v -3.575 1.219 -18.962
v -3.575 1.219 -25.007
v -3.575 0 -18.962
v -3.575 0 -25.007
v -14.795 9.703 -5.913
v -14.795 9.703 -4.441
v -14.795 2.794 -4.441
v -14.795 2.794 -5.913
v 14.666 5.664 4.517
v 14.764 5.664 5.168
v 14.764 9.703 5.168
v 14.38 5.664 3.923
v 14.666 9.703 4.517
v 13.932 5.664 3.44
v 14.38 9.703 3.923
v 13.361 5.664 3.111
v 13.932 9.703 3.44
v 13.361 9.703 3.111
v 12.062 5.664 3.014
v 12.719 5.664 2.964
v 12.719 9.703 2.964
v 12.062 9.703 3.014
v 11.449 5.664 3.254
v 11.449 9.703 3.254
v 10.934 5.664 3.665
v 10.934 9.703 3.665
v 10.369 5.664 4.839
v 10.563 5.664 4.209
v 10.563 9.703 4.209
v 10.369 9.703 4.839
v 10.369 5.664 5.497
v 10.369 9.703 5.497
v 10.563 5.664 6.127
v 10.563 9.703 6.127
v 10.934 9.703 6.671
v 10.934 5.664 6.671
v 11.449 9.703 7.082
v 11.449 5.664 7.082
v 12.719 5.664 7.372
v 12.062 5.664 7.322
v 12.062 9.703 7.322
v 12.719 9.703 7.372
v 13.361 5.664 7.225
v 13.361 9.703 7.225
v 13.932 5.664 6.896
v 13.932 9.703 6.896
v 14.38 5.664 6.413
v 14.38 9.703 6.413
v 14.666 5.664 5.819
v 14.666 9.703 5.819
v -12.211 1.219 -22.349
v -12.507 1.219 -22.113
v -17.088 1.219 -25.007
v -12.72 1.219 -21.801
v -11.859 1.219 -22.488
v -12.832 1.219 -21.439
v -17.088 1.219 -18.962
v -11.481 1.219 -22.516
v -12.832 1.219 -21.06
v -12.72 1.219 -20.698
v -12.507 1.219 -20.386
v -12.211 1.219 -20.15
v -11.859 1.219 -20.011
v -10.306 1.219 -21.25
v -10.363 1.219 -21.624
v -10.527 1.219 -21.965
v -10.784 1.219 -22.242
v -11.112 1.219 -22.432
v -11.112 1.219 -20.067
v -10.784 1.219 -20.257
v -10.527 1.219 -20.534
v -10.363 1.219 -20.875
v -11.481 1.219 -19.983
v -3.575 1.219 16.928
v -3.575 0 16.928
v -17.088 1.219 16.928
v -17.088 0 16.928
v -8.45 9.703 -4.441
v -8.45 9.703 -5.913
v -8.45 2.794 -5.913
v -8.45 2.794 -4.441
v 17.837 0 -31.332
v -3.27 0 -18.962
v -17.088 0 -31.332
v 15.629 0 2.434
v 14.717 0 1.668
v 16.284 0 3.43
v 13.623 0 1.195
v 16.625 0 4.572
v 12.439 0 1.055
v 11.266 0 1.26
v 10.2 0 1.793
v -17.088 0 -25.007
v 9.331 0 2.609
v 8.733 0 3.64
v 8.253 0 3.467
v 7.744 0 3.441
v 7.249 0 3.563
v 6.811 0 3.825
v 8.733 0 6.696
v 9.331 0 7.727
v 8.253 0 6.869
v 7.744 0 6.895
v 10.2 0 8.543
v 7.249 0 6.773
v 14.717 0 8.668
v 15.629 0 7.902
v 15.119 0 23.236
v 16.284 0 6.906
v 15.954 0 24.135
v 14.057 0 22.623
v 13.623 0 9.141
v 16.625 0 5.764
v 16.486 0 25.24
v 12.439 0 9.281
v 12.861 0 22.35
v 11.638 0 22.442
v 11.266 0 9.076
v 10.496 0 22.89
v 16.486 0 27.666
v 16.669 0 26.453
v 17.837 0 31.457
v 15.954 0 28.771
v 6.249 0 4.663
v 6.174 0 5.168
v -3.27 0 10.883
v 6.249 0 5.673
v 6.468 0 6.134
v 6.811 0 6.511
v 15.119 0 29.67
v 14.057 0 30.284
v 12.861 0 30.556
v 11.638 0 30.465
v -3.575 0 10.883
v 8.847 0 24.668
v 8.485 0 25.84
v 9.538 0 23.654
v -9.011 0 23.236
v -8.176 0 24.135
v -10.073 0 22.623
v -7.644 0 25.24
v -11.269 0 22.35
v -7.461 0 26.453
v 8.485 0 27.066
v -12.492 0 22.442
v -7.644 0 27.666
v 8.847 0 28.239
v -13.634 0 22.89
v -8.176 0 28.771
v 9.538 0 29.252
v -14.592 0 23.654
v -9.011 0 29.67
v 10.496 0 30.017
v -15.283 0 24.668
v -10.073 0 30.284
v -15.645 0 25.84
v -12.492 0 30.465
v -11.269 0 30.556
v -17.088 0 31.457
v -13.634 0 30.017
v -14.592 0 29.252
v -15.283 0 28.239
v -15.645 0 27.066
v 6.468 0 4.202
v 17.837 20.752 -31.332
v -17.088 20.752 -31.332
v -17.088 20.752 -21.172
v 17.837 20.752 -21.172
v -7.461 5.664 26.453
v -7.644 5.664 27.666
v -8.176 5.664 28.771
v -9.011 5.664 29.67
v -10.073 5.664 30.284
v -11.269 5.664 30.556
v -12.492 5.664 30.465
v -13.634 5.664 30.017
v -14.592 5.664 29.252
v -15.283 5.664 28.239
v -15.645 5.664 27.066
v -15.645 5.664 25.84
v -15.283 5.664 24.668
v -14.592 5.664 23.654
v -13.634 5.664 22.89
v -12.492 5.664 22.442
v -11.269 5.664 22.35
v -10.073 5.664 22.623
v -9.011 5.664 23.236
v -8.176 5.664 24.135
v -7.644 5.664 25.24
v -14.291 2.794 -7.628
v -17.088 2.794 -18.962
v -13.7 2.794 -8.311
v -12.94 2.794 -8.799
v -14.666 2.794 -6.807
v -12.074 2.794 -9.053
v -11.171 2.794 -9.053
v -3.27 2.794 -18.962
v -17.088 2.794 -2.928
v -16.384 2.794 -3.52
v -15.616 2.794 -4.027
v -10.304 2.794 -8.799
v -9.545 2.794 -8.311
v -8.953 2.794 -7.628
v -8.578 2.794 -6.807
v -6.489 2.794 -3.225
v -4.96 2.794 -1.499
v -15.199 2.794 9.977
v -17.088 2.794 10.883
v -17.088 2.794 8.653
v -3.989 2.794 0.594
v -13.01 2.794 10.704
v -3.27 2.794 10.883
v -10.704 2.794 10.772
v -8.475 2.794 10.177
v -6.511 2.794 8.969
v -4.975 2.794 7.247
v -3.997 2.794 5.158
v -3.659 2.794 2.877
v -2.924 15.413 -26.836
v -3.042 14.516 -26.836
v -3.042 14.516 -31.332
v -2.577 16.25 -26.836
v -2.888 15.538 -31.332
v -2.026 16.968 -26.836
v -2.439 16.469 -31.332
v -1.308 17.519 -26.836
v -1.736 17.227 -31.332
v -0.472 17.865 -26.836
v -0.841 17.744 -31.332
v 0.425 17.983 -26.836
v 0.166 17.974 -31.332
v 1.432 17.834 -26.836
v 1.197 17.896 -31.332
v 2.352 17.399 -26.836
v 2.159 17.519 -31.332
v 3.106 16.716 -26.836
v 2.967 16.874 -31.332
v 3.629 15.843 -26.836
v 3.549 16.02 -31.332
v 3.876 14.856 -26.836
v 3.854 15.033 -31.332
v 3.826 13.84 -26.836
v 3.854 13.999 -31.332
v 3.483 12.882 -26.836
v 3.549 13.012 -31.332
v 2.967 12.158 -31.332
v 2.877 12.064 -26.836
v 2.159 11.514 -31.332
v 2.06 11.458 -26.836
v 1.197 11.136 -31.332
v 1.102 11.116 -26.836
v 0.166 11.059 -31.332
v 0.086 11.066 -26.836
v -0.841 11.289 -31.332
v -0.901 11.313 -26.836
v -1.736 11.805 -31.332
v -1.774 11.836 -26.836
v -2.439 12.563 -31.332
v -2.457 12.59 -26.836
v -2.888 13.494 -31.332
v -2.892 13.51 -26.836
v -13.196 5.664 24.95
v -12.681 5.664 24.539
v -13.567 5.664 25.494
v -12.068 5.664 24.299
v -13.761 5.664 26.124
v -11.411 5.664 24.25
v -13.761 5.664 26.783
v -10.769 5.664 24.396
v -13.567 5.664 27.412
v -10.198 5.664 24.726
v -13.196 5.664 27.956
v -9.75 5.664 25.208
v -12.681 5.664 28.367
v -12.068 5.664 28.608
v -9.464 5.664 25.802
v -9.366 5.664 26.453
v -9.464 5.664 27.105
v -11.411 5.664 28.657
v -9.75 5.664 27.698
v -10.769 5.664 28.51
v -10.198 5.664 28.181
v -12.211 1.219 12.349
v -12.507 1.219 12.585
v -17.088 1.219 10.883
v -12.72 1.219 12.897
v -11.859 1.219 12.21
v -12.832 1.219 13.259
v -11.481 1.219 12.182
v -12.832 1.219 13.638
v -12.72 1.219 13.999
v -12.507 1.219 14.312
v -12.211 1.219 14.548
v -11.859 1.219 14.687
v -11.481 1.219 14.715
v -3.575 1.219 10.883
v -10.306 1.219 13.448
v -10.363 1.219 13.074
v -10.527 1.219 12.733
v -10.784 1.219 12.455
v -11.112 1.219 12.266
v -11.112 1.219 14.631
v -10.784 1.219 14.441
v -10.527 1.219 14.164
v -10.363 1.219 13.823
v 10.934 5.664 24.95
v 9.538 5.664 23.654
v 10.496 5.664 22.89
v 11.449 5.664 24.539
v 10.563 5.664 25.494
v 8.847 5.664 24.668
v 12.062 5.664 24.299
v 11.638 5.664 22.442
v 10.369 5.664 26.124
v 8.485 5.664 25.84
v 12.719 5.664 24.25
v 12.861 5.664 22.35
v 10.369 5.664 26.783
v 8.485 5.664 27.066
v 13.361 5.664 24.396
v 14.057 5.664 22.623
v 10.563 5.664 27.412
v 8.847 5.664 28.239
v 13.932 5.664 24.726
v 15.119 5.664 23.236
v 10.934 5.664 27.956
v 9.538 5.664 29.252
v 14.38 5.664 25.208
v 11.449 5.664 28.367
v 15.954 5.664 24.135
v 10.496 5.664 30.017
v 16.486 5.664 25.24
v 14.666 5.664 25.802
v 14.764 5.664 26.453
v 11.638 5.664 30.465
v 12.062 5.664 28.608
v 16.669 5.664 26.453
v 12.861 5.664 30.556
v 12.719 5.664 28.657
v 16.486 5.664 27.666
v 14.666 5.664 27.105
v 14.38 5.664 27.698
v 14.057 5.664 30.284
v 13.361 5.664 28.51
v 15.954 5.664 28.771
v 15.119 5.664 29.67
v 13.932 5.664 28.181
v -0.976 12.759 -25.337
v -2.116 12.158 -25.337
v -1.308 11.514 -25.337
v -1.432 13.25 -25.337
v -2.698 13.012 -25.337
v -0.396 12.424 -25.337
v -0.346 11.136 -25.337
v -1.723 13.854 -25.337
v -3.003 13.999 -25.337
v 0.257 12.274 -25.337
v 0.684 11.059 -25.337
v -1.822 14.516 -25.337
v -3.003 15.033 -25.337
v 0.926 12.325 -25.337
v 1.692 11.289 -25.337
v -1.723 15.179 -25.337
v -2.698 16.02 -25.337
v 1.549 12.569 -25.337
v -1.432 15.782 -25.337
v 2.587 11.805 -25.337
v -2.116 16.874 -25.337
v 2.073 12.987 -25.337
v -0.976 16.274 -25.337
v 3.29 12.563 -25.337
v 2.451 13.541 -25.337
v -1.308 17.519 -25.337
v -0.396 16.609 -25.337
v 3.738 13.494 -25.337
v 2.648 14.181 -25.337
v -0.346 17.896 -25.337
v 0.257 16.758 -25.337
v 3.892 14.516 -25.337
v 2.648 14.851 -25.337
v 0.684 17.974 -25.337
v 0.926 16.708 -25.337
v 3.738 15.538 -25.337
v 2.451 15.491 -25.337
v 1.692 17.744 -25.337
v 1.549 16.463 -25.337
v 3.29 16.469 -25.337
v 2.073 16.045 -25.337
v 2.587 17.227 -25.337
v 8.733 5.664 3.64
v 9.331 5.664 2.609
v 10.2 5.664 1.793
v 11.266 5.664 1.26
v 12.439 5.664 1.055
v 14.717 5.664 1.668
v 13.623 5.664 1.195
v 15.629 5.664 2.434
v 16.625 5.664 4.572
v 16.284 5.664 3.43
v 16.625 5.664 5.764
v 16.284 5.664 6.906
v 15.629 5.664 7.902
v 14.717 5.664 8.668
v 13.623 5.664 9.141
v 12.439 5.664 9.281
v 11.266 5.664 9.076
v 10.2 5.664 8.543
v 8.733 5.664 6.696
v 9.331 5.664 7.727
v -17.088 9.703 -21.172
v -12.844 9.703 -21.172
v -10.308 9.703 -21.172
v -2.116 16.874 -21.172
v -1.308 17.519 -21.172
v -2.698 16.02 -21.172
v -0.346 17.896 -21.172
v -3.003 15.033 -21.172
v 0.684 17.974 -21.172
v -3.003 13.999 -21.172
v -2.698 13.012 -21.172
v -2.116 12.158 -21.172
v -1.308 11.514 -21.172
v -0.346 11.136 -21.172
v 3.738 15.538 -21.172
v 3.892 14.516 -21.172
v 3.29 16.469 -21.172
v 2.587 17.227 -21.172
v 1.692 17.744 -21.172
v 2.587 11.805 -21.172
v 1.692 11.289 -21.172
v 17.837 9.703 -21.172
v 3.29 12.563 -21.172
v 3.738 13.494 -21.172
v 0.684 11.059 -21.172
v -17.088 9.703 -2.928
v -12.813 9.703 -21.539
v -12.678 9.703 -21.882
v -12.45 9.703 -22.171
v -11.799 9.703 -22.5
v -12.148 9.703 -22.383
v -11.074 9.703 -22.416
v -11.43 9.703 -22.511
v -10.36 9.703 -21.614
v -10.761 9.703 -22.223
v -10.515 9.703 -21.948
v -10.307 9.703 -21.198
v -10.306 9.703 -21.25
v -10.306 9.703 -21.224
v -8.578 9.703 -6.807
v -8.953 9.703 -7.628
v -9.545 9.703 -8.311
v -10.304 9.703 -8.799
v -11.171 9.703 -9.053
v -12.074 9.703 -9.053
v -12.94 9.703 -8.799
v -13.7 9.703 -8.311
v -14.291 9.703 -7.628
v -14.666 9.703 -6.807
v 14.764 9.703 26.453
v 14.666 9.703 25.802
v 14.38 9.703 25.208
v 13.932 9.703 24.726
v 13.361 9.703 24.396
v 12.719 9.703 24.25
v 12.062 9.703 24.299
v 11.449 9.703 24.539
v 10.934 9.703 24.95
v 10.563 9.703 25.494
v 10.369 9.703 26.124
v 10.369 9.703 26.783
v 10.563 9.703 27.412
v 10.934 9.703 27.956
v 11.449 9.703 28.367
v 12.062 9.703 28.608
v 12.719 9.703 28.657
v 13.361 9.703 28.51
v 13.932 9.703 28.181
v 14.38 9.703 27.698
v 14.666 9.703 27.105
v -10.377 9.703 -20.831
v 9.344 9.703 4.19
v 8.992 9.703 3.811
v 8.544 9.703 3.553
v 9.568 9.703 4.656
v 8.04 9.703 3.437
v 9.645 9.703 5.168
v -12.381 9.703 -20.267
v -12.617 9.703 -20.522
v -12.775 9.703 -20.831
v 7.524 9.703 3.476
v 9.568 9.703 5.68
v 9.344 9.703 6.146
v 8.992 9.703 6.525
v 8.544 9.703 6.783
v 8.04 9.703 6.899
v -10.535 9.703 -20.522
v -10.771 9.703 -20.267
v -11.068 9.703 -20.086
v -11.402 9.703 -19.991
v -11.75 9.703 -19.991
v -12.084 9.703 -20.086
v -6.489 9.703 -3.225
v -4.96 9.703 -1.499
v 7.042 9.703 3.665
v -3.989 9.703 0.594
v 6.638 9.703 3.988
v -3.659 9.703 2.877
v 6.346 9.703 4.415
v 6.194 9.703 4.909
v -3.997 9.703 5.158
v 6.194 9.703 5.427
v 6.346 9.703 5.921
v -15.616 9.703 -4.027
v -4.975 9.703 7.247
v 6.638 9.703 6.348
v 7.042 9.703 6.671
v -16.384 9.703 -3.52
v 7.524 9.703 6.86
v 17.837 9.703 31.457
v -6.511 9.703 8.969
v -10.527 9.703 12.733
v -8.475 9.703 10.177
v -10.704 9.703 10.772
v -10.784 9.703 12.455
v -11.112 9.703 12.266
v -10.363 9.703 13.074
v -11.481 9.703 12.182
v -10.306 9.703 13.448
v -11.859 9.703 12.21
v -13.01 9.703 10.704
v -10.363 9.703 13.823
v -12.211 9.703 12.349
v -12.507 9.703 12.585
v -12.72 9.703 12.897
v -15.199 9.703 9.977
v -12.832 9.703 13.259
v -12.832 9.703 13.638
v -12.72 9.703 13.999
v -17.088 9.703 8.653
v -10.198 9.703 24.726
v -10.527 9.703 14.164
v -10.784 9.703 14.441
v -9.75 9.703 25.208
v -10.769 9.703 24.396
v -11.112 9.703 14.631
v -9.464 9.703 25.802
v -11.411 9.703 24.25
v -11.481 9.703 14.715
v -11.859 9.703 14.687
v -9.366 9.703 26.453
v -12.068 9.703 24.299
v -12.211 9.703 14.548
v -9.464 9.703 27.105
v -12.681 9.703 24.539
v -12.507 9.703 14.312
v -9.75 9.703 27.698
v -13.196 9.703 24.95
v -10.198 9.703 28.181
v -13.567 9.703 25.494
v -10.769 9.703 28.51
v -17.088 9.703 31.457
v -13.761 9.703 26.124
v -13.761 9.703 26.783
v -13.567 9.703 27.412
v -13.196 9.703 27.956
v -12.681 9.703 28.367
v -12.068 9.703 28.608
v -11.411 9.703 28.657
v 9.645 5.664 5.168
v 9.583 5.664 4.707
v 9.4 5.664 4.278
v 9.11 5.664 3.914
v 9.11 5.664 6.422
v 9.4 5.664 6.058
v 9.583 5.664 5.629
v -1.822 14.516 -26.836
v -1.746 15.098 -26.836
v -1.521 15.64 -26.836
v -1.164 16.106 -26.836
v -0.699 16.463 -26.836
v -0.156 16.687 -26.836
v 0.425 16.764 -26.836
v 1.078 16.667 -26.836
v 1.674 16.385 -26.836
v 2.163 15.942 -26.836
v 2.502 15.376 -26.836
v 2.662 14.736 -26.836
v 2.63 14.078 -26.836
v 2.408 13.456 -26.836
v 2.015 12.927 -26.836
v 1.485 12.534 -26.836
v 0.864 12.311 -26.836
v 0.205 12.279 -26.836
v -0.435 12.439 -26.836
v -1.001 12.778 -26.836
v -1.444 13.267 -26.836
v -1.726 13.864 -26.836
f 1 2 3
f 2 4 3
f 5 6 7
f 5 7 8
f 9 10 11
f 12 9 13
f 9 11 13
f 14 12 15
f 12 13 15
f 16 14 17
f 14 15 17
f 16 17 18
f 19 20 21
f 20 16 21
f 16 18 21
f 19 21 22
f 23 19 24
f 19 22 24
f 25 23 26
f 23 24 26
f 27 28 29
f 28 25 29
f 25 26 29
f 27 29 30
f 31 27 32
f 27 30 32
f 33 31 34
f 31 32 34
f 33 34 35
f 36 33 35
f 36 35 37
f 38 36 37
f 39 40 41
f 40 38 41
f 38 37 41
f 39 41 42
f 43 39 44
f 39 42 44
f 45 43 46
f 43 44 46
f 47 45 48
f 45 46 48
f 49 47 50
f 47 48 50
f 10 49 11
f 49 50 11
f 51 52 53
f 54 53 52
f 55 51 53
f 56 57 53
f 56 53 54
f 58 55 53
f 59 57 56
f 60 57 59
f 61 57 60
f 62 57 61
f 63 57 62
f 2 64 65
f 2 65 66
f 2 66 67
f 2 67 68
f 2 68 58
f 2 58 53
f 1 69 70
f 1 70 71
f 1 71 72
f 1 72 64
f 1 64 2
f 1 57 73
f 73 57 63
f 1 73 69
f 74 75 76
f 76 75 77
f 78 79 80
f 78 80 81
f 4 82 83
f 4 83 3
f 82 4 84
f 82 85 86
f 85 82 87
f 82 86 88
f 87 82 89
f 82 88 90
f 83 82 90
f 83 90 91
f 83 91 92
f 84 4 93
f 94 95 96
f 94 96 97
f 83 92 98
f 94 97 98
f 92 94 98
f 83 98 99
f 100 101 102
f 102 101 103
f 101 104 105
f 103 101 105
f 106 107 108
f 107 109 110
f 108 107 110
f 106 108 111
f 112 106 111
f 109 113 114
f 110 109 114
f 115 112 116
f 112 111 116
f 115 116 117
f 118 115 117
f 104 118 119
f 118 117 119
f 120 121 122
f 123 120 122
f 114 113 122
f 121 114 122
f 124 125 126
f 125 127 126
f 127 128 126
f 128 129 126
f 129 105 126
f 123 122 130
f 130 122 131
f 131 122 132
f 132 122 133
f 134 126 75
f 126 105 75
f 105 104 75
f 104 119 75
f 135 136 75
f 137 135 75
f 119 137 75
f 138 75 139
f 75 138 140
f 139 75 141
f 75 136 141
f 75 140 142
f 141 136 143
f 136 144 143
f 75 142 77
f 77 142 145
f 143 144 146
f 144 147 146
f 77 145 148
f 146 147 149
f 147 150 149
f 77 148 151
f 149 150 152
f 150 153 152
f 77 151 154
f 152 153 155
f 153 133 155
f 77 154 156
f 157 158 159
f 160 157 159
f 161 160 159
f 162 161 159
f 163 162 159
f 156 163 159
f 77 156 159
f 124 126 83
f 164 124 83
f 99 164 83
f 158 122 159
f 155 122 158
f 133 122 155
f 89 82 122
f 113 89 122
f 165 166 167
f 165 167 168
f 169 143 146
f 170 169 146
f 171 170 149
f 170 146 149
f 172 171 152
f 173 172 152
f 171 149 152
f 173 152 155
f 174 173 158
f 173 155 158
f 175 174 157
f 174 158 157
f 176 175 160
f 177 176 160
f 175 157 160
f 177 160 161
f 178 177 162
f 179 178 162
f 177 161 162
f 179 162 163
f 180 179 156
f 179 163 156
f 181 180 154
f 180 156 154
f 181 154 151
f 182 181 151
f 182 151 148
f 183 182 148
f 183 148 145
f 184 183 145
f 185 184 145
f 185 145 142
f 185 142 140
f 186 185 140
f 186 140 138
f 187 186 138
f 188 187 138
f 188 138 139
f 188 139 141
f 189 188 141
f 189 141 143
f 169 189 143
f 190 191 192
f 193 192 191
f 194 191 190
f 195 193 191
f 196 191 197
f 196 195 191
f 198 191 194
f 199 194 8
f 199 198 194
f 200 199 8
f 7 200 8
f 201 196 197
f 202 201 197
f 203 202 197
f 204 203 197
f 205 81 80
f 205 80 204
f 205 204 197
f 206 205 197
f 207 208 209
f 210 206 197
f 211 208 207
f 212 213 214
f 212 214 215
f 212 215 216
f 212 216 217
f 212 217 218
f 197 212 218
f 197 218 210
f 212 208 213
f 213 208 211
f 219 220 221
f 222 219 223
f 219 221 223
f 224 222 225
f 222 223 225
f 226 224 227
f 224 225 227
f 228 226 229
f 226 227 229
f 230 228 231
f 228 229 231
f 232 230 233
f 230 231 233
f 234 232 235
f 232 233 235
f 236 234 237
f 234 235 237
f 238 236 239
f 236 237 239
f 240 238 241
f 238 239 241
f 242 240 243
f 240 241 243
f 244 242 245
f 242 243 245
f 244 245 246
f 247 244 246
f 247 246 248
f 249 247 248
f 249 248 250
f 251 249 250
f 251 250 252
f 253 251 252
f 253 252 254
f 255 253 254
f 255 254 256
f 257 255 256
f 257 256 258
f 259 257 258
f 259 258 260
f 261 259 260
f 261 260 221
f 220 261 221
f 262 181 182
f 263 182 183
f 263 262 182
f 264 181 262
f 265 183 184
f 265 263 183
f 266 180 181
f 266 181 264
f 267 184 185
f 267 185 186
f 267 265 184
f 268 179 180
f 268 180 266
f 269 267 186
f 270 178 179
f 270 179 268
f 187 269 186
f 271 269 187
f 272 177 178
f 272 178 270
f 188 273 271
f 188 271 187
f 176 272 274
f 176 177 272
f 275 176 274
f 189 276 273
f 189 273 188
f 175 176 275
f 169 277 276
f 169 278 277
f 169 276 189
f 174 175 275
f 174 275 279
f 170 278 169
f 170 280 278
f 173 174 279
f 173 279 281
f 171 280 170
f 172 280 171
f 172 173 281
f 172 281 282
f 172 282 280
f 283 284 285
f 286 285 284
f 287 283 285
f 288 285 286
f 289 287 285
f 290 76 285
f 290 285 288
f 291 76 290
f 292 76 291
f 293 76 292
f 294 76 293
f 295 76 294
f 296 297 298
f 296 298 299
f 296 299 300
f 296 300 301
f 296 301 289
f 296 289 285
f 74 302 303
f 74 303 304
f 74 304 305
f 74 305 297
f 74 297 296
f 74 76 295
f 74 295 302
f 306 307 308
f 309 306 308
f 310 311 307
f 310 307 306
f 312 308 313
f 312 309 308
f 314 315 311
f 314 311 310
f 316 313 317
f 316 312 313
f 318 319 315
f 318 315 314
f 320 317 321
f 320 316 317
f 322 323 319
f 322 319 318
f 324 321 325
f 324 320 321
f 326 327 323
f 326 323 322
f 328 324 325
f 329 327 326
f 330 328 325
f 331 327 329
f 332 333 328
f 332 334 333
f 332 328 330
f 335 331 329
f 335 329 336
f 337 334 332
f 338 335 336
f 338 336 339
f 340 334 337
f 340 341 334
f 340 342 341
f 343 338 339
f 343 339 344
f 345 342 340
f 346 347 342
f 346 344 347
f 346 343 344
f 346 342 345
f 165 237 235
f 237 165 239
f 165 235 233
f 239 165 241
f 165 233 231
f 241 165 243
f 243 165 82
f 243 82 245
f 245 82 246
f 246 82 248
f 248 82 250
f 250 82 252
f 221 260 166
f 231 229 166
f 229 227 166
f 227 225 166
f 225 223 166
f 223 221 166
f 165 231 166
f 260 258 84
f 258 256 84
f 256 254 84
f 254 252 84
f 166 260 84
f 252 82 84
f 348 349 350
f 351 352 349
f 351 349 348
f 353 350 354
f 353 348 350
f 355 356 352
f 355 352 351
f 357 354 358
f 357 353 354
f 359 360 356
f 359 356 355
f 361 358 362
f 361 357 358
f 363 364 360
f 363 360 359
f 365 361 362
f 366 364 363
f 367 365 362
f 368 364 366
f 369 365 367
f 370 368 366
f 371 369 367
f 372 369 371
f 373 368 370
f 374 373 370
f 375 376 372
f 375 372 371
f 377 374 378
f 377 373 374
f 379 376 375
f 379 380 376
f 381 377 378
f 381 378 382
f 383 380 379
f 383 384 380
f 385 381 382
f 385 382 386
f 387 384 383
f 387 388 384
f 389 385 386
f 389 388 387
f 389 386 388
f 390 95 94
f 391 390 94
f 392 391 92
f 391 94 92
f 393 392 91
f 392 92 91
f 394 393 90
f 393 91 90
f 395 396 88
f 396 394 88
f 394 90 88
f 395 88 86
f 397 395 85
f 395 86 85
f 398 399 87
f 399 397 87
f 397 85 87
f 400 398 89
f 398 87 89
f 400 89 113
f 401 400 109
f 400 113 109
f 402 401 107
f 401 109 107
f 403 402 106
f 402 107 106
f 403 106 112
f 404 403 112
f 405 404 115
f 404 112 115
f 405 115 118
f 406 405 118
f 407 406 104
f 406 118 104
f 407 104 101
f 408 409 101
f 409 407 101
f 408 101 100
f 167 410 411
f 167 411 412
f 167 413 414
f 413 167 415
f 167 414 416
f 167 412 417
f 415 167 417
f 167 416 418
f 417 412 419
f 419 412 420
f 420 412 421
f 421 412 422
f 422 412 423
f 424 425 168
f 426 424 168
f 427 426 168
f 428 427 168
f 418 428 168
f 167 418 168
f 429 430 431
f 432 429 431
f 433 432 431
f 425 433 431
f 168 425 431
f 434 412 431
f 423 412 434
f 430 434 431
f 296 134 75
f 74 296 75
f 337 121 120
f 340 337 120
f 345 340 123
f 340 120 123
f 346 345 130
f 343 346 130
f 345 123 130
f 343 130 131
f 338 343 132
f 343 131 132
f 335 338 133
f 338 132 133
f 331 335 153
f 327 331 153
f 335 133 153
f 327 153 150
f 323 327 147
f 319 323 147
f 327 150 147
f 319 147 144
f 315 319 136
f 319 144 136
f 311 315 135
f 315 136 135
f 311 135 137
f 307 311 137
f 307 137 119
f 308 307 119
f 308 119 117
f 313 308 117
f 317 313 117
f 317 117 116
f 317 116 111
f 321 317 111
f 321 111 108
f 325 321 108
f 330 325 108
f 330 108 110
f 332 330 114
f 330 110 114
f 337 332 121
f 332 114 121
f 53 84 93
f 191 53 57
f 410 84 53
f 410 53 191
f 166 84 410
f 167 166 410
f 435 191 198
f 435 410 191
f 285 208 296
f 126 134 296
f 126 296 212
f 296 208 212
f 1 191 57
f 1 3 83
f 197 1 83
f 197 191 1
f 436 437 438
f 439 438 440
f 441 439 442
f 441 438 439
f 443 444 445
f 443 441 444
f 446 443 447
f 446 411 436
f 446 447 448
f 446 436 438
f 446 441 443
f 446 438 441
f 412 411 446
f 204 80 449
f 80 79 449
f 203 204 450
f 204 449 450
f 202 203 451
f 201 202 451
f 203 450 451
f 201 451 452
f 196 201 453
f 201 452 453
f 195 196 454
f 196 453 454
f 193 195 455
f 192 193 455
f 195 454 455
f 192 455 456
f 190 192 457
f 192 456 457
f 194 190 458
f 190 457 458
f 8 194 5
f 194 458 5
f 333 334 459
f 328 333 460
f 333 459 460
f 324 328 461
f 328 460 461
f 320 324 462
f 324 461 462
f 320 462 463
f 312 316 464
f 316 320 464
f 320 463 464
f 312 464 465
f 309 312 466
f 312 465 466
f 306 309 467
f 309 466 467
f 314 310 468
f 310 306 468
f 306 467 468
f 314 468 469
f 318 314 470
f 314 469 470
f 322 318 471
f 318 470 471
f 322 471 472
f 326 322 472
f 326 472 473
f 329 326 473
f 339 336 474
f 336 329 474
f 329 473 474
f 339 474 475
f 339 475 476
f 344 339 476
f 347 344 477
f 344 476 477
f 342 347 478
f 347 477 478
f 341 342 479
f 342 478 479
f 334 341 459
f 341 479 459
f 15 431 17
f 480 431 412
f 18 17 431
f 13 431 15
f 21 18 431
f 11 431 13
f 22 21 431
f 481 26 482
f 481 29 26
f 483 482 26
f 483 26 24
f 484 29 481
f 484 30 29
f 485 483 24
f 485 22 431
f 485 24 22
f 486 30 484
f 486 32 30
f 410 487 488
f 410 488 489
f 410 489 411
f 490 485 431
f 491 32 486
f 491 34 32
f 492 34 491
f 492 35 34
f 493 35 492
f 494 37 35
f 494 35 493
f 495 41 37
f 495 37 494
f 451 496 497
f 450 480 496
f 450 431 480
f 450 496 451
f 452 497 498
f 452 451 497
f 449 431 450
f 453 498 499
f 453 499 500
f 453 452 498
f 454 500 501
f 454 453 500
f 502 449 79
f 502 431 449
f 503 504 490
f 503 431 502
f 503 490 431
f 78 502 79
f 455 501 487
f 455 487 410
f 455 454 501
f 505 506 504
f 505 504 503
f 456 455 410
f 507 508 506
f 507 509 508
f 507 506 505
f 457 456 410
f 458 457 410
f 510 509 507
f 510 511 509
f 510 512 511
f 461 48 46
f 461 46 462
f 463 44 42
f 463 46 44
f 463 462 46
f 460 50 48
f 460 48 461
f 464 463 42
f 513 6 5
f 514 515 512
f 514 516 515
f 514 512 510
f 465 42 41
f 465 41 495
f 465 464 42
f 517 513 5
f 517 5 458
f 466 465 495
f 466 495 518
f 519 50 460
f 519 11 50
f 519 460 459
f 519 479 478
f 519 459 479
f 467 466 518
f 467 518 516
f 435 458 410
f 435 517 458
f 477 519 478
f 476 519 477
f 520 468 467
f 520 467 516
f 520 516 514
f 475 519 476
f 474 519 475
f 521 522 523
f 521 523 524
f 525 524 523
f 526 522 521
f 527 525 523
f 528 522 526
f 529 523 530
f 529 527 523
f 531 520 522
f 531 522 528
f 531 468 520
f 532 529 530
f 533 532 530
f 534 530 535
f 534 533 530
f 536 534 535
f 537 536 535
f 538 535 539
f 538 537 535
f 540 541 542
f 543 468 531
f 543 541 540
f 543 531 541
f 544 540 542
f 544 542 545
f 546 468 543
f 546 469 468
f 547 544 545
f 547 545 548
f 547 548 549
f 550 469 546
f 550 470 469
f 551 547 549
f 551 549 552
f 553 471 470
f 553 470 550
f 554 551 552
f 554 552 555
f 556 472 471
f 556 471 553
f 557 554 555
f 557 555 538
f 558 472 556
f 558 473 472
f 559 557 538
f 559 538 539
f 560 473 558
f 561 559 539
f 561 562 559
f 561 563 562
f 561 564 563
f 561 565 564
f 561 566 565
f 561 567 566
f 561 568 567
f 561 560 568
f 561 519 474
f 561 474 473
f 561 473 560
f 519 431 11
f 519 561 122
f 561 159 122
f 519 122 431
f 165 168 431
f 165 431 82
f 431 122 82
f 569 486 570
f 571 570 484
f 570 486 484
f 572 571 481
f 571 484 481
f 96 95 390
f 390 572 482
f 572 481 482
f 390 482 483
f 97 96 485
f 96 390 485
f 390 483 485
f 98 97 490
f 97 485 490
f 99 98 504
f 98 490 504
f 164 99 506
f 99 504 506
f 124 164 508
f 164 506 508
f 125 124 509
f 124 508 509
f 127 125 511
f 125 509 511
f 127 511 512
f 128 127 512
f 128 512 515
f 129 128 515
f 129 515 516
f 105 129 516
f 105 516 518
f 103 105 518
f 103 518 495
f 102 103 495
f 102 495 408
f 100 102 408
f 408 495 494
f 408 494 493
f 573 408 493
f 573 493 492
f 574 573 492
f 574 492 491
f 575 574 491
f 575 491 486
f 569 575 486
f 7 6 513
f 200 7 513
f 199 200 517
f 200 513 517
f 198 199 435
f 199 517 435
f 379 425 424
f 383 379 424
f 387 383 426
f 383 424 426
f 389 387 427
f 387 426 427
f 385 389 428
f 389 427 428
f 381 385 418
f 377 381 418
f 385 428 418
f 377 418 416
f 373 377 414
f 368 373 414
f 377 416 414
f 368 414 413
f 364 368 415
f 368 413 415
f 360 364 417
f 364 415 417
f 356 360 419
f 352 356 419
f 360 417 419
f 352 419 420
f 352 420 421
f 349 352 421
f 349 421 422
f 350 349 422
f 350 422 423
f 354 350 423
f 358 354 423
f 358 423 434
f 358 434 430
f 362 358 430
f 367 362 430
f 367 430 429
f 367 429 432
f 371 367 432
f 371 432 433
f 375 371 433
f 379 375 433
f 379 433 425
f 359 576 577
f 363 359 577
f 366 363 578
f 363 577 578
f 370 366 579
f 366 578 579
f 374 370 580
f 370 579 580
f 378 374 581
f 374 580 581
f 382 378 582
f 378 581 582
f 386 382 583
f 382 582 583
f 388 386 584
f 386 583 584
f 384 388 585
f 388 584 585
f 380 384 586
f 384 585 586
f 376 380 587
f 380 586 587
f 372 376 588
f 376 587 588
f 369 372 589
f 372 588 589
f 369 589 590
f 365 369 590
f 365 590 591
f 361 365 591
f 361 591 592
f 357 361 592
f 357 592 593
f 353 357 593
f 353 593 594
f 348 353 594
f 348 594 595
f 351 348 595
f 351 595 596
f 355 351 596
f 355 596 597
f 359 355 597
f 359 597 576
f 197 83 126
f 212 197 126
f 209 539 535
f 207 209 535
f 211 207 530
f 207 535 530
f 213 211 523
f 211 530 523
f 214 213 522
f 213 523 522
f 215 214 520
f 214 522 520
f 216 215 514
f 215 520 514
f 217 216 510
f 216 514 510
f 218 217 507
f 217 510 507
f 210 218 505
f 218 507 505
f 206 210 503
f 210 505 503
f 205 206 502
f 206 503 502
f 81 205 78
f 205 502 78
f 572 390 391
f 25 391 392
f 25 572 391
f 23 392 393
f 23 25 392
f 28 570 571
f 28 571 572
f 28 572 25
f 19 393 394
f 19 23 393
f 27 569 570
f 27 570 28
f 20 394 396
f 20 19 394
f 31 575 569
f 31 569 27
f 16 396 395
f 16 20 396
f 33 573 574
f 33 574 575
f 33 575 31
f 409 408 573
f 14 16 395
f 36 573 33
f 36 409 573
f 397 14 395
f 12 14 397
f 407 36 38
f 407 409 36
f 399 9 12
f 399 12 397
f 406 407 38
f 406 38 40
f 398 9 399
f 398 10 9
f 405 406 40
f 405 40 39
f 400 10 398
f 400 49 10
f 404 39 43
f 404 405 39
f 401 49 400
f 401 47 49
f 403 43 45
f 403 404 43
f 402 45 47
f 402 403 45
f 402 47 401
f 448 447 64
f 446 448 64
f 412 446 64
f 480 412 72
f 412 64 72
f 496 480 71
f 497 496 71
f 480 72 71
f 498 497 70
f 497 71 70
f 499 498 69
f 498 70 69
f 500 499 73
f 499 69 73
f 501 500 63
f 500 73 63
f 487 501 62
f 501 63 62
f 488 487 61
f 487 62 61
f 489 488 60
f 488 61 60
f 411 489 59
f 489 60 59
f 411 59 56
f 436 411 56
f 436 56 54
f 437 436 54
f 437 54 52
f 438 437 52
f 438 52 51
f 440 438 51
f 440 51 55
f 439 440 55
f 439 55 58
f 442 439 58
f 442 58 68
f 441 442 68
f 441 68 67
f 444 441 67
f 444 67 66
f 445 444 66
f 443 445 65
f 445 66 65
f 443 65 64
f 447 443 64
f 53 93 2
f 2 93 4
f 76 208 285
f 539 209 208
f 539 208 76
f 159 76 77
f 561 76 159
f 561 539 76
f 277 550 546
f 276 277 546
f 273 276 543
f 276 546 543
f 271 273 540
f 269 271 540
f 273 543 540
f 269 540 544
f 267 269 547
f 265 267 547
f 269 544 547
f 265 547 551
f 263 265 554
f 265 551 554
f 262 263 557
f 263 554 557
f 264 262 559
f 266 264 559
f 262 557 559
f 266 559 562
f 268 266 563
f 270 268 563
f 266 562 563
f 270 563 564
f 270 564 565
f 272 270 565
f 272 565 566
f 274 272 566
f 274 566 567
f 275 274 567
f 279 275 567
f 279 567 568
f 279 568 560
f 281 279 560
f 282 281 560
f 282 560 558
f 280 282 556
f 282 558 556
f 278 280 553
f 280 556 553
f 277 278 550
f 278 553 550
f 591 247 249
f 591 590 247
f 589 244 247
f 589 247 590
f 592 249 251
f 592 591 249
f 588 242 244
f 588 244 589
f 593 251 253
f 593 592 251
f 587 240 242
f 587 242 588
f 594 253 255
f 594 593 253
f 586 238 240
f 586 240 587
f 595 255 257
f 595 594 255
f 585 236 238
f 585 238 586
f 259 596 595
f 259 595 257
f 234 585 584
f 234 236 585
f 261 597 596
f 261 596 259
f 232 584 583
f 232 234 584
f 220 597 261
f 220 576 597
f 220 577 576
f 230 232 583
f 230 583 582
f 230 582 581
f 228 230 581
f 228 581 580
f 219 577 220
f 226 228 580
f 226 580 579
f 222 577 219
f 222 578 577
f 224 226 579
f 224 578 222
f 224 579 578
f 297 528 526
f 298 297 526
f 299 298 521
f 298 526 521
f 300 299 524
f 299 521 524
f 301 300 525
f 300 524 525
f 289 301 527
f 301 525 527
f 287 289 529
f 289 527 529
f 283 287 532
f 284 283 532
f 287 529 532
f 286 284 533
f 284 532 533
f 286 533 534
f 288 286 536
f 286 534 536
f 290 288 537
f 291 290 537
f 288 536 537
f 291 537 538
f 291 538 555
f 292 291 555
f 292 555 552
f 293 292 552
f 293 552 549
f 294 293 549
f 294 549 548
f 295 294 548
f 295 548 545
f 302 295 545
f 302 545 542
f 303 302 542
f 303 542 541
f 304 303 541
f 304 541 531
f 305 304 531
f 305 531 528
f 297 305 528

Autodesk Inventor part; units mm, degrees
ref_plane "YZ Plane" through (0, 0, 0) normal (1, 0, 0) x (0, 1, 0)
ref_plane "XZ Plane" through (0, 0, 0) normal (0, 1, 0) x (-1, 0, 0)
sketch "Sketch1" plane through (0, 0, 0) normal (0, 1, 0) x (-1, 0, 0)
  line L0 (17.0879, 31.457) -> (-17.8371, 31.457)
  line L1 (-17.8371, 31.457) -> (-17.8371, -31.3318)
  line L2 (-17.8371, -31.3318) -> (17.0879, -31.3318)
  line L3 (17.0879, -31.3318) -> (17.0879, 31.457)
  point P0 (0, 0)
  dimension "d0" = 34.925
  dimension "d1" = 62.7888
extrude "Extrusion1" add sketch "Sketch1" along normal blind 9.7028
sketch "Sketch2" plane through (0, 9.7028, 0) normal (0, 1, 0) x (1, 0, 0)
  line L0 (17.8371, -31.457) -> (17.8371, 31.3318) projected
  line L1 (-17.0879, 31.3318) -> (-17.0879, -31.457) projected
  line L2 (17.8371, 31.3318) -> (-17.0879, 31.3318)
  line L3 (-17.0879, 31.3318) -> (-17.0879, 21.1718)
  line L4 (-17.0879, 21.1718) -> (17.8371, 21.1718)
  line L5 (17.8371, 21.1718) -> (17.8371, 31.3318)
  point P0 (0, 0)
  dimension "d4" = 10.16
extrude "Extrusion2" add sketch "Sketch2" along normal blind 11.049
sketch "Sketch3" plane through (0, 0, 0) normal (0, -1, 0) x (1, 0, 0)
  line L0 (17.8371, -31.3318) -> (-17.0879, -31.3318) projected
  line L1 (-17.0879, -31.3318) -> (-17.0879, -25.0072)
  line L2 (-17.0879, -31.3318) -> (-17.0879, 31.457) projected
  line L3 (-17.0879, -25.0072) -> (-3.5751, -25.0072)
  line L4 (-3.5751, -25.0072) -> (-3.5751, -18.962)
  line L5 (-3.5751, -18.962) -> (-3.2703, -18.962)
  line L6 (-3.2703, -18.962) -> (-3.2703, 10.883)
  line L7 (-3.2703, 10.883) -> (-3.5751, 10.883)
  line L8 (-3.5751, 10.883) -> (-3.5751, 16.9282)
  line L9 (-3.5751, 16.9282) -> (-16.9609, 16.9282)
  line L10 (-16.9609, 16.9282) -> (-17.0879, 16.9282)
  point P0 (0, 0)
  dimension "d7" = 6.3246
  dimension "d8" = 13.5128
  dimension "d9" = 6.0452
  dimension "d10" = 0.3048
  dimension "d11" = 29.845
  dimension "d14" = 0.3048
  dimension "d15" = 6.0452
  dimension "d16" = 13.3858
extrude "Extrusion3" cut sketch "Sketch3" against normal blind 2.794
sketch "Sketch4" plane through (0, 2.794, 0) normal (0, -1, 0) x (1, 0, 0)
  line L0 (-3.5751, 16.9282) -> (-17.0879, 16.9282)
  line L1 (-17.0879, 16.9282) -> (-17.0879, 10.883)
  line L2 (-17.0879, 10.883) -> (-3.5751, 10.883)
  line L3 (-3.5751, 10.883) -> (-3.5751, 16.9282)
  point P0 (0, 0)
  dimension "d19" = 13.5128
  dimension "d20" = 6.0452
sketch "Sketch5" plane through (0, 2.794, 0) normal (0, -1, 0) x (1, 0, 0)
  line L0 (-3.5751, -18.962) -> (-3.5751, -25.0072) projected
  line L1 (-3.5751, -25.0072) -> (-17.0879, -25.0072)
  line L2 (-17.0879, -25.0072) -> (-17.0879, -18.962)
  line L3 (-17.0879, -18.962) -> (-3.5751, -18.962)
  line L4 (-3.5751, -18.962) -> (-3.5751, -25.0072)
  point P0 (0, 0)
  dimension "d21" = 13.5128
  dimension "d22" = 6.0452
extrude "Extrusion5" add sketch "Sketch4" along normal blind 1.5748
extrude "Extrusion6" add sketch "Sketch5" along normal blind 1.5748
sketch "Sketch6" plane through (0, 9.7028, 0) normal (0, 1, 0) x (1, 0, 0)
  circle A0 centre (-11.6221, -2.8625) radius 7.9629
  line L0 (-17.0879, 18.962) -> (-17.0879, -10.883) projected
  line L1 (-11.6221, -10.1806) -> (-11.6221, 5.913) construction
  line L2 (-14.7946, -10.1806) -> (-14.7946, 5.913)
  line L3 (-8.4496, 5.913) -> (-8.4496, -10.1806)
  arc A1 (-8.4496, 5.913) -> (-14.7946, 5.913) centre (-11.6221, 5.913) ccw
  point P0 (0, 0)
  point P1 (-17.0879, 21.1718)
  point P2 (-11.6221, -2.1338)
  point P3 (-17.0879, 2.9283)
  point P4 (-17.0879, -8.6532)
  point P5 (-8.4496, 4.4412)
  point P6 (-14.7946, 4.4412)
  dimension "d31" = 15.9258
extrude "Extrusion7" cut sketch "Sketch6" against normal blind 25.4 contours A0 L3 | L3 A0 L2 | A0 L2 A1 L3 | L2 A0 L0
ref_plane "Work Plane1" through (0, 0, 0) normal (0, 1, 0) x (1, 0, 0)
sketch "Sketch7" plane through (0, 9.7028, 0) normal (0, 1, 0) x (1, 0, 0)
  line L0 (17.8371, -31.457) -> (17.8371, -28.663)
  line L1 (17.8371, -28.663) -> (17.8371, -26.4532)
  line L2 (14.7637, -26.4532) -> (12.5539, -26.4532)
  circle A0 centre (12.5539, -26.4532) radius 2.2098
  circle A1 centre (12.5539, -5.168) radius 2.2098
  line L3 (-17.0879, -8.6532) -> (-17.0879, -31.457) projected
  line L4 (-17.0879, -26.4532) -> (-13.7859, -26.4532) construction
  circle A2 centre (-11.5761, -26.4532) radius 2.2098
  line L5 (-11.5761, -14.7184) -> (-11.5761, -13.4484)
  circle A3 centre (-11.5761, -13.4484) radius 1.27
  line L6 (-11.5761, -13.4484) -> (-17.0879, -13.4484)
  line L7 (-17.0879, -16.9282) -> (-17.0879, -10.883) projected
  circle A4 centre (12.5539, -5.168) radius 4.1148
  circle A5 centre (12.5539, -26.4532) radius 4.1148
  circle A6 centre (-11.5761, -26.4532) radius 4.1148
  point P0 (0, 0)
  dimension "d37" = 2.794
  dimension "d38" = 2.2098
  dimension "d39" = 3.0734
  dimension "d40" = 2.2098
  dimension "d42" = 4.4196
  dimension "d43" = 4.4196
  dimension "d47" = 4.4196
  dimension "d49" = 1.27
  dimension "d50" = 2.54
  dimension "d58" = 8.2296
  dimension "d59" = 8.2296
  dimension "d60" = 8.2296
extrude "Extrusion8" cut sketch "Sketch7" against normal blind 25.4 contours A0 | A1 | A2 | A3 L6 L5 | L5 L6 A3
sketch "Sketch9" plane through (0, 1.2192, 0) normal (0, -1, 0) x (1, 0, 0)
  line L0 (-3.5751, -18.962) -> (-17.0879, -18.962) projected
  line L1 (-17.0879, -18.962) -> (-11.5761, -18.962)
  line L2 (-11.5761, -25.0595) -> (-11.5761, -21.2495)
  circle A0 centre (-11.5761, -21.2495) radius 1.27
  point P0 (0, 0)
  dimension "d53" = 5.5118
  dimension "d54" = 3.81
  dimension "d55" = 2.54
extrude "Extrusion9" cut sketch "Sketch9" against normal blind 8.4836
sketch "Sketch11" plane through (0, 0, 0) normal (0, -1, 0) x (1, 0, 0)
  circle A0 centre (-11.5761, 26.4532) radius 2.2098 projected
  circle A1 centre (-11.5761, 26.4532) radius 4.1148
  circle A2 centre (12.5539, 26.4532) radius 2.2098 projected
  circle A3 centre (12.5539, 26.4532) radius 4.1148
  circle A4 centre (12.5539, 5.168) radius 2.2098 projected
  circle A5 centre (12.5539, 5.168) radius 4.1148
  point P0 (0, 0)
  dimension "d62" = 8.2296
  dimension "d63" = 8.2296
  dimension "d64" = 8.2296
extrude "Extrusion10" cut sketch "Sketch11" against normal blind 5.6642 contours A0 | A1 | A3 | A5
sketch "Sketch12" plane through (17.8371, 0, -31.3318) normal (0, 0, -1) x (-1, 0, 0)
  line L0 (0, 0) -> (0, 20.7518) projected
  line L1 (0, 20.7518) -> (13.9446, 20.7518)
  line L2 (0, 20.7518) -> (34.925, 20.7518) projected
  line L3 (13.9446, 20.7518) -> (17.4117, 20.7518)
  line L4 (17.4117, 20.7518) -> (17.4117, 17.9832)
  line L5 (17.4117, 17.9832) -> (17.4117, 14.5161)
  circle A0 centre (17.4117, 14.5161) radius 2.2479
  circle A1 centre (17.4117, 14.5161) radius 3.4671
  point P0 (17.8371, 0)
  dimension "d67" = 13.9446
  dimension "d68" = 3.4671
  dimension "d69" = 2.7686
  dimension "d70" = 3.4671
  dimension "d71" = 4.4958
  dimension "d72" = 6.9342
extrude "Extrusion11" cut sketch "Sketch12" against normal through all contours A0
extrude "Extrusion13" cut sketch "Sketch12" against normal blind 4.4958
sketch "Sketch13" plane through (-17.0879, 20.7518, -21.1718) normal (0, 0, 1) x (1, 0, 0)
  circle A0 centre (17.5133, -6.2357) radius 3.4671 projected
  circle A1 centre (17.5133, -6.2357) radius 2.7813
  point P0 (17.0879, -20.7518)
  dimension "d79" = 5.5626
extrude "Extrusion14" cut sketch "Sketch13" against normal blind 4.1656 contours A0 | A1
sketch "Sketch14" plane through (0, 9.7028, 0) normal (0, 1, 0) x (1, 0, 0)
  circle A0 centre (7.9099, -5.168) radius 1.7354
  point P0 (0, 0)
extrude "Extrusion15" cut sketch "Sketch14" against normal blind 12.7
properties part number "Hand1"
